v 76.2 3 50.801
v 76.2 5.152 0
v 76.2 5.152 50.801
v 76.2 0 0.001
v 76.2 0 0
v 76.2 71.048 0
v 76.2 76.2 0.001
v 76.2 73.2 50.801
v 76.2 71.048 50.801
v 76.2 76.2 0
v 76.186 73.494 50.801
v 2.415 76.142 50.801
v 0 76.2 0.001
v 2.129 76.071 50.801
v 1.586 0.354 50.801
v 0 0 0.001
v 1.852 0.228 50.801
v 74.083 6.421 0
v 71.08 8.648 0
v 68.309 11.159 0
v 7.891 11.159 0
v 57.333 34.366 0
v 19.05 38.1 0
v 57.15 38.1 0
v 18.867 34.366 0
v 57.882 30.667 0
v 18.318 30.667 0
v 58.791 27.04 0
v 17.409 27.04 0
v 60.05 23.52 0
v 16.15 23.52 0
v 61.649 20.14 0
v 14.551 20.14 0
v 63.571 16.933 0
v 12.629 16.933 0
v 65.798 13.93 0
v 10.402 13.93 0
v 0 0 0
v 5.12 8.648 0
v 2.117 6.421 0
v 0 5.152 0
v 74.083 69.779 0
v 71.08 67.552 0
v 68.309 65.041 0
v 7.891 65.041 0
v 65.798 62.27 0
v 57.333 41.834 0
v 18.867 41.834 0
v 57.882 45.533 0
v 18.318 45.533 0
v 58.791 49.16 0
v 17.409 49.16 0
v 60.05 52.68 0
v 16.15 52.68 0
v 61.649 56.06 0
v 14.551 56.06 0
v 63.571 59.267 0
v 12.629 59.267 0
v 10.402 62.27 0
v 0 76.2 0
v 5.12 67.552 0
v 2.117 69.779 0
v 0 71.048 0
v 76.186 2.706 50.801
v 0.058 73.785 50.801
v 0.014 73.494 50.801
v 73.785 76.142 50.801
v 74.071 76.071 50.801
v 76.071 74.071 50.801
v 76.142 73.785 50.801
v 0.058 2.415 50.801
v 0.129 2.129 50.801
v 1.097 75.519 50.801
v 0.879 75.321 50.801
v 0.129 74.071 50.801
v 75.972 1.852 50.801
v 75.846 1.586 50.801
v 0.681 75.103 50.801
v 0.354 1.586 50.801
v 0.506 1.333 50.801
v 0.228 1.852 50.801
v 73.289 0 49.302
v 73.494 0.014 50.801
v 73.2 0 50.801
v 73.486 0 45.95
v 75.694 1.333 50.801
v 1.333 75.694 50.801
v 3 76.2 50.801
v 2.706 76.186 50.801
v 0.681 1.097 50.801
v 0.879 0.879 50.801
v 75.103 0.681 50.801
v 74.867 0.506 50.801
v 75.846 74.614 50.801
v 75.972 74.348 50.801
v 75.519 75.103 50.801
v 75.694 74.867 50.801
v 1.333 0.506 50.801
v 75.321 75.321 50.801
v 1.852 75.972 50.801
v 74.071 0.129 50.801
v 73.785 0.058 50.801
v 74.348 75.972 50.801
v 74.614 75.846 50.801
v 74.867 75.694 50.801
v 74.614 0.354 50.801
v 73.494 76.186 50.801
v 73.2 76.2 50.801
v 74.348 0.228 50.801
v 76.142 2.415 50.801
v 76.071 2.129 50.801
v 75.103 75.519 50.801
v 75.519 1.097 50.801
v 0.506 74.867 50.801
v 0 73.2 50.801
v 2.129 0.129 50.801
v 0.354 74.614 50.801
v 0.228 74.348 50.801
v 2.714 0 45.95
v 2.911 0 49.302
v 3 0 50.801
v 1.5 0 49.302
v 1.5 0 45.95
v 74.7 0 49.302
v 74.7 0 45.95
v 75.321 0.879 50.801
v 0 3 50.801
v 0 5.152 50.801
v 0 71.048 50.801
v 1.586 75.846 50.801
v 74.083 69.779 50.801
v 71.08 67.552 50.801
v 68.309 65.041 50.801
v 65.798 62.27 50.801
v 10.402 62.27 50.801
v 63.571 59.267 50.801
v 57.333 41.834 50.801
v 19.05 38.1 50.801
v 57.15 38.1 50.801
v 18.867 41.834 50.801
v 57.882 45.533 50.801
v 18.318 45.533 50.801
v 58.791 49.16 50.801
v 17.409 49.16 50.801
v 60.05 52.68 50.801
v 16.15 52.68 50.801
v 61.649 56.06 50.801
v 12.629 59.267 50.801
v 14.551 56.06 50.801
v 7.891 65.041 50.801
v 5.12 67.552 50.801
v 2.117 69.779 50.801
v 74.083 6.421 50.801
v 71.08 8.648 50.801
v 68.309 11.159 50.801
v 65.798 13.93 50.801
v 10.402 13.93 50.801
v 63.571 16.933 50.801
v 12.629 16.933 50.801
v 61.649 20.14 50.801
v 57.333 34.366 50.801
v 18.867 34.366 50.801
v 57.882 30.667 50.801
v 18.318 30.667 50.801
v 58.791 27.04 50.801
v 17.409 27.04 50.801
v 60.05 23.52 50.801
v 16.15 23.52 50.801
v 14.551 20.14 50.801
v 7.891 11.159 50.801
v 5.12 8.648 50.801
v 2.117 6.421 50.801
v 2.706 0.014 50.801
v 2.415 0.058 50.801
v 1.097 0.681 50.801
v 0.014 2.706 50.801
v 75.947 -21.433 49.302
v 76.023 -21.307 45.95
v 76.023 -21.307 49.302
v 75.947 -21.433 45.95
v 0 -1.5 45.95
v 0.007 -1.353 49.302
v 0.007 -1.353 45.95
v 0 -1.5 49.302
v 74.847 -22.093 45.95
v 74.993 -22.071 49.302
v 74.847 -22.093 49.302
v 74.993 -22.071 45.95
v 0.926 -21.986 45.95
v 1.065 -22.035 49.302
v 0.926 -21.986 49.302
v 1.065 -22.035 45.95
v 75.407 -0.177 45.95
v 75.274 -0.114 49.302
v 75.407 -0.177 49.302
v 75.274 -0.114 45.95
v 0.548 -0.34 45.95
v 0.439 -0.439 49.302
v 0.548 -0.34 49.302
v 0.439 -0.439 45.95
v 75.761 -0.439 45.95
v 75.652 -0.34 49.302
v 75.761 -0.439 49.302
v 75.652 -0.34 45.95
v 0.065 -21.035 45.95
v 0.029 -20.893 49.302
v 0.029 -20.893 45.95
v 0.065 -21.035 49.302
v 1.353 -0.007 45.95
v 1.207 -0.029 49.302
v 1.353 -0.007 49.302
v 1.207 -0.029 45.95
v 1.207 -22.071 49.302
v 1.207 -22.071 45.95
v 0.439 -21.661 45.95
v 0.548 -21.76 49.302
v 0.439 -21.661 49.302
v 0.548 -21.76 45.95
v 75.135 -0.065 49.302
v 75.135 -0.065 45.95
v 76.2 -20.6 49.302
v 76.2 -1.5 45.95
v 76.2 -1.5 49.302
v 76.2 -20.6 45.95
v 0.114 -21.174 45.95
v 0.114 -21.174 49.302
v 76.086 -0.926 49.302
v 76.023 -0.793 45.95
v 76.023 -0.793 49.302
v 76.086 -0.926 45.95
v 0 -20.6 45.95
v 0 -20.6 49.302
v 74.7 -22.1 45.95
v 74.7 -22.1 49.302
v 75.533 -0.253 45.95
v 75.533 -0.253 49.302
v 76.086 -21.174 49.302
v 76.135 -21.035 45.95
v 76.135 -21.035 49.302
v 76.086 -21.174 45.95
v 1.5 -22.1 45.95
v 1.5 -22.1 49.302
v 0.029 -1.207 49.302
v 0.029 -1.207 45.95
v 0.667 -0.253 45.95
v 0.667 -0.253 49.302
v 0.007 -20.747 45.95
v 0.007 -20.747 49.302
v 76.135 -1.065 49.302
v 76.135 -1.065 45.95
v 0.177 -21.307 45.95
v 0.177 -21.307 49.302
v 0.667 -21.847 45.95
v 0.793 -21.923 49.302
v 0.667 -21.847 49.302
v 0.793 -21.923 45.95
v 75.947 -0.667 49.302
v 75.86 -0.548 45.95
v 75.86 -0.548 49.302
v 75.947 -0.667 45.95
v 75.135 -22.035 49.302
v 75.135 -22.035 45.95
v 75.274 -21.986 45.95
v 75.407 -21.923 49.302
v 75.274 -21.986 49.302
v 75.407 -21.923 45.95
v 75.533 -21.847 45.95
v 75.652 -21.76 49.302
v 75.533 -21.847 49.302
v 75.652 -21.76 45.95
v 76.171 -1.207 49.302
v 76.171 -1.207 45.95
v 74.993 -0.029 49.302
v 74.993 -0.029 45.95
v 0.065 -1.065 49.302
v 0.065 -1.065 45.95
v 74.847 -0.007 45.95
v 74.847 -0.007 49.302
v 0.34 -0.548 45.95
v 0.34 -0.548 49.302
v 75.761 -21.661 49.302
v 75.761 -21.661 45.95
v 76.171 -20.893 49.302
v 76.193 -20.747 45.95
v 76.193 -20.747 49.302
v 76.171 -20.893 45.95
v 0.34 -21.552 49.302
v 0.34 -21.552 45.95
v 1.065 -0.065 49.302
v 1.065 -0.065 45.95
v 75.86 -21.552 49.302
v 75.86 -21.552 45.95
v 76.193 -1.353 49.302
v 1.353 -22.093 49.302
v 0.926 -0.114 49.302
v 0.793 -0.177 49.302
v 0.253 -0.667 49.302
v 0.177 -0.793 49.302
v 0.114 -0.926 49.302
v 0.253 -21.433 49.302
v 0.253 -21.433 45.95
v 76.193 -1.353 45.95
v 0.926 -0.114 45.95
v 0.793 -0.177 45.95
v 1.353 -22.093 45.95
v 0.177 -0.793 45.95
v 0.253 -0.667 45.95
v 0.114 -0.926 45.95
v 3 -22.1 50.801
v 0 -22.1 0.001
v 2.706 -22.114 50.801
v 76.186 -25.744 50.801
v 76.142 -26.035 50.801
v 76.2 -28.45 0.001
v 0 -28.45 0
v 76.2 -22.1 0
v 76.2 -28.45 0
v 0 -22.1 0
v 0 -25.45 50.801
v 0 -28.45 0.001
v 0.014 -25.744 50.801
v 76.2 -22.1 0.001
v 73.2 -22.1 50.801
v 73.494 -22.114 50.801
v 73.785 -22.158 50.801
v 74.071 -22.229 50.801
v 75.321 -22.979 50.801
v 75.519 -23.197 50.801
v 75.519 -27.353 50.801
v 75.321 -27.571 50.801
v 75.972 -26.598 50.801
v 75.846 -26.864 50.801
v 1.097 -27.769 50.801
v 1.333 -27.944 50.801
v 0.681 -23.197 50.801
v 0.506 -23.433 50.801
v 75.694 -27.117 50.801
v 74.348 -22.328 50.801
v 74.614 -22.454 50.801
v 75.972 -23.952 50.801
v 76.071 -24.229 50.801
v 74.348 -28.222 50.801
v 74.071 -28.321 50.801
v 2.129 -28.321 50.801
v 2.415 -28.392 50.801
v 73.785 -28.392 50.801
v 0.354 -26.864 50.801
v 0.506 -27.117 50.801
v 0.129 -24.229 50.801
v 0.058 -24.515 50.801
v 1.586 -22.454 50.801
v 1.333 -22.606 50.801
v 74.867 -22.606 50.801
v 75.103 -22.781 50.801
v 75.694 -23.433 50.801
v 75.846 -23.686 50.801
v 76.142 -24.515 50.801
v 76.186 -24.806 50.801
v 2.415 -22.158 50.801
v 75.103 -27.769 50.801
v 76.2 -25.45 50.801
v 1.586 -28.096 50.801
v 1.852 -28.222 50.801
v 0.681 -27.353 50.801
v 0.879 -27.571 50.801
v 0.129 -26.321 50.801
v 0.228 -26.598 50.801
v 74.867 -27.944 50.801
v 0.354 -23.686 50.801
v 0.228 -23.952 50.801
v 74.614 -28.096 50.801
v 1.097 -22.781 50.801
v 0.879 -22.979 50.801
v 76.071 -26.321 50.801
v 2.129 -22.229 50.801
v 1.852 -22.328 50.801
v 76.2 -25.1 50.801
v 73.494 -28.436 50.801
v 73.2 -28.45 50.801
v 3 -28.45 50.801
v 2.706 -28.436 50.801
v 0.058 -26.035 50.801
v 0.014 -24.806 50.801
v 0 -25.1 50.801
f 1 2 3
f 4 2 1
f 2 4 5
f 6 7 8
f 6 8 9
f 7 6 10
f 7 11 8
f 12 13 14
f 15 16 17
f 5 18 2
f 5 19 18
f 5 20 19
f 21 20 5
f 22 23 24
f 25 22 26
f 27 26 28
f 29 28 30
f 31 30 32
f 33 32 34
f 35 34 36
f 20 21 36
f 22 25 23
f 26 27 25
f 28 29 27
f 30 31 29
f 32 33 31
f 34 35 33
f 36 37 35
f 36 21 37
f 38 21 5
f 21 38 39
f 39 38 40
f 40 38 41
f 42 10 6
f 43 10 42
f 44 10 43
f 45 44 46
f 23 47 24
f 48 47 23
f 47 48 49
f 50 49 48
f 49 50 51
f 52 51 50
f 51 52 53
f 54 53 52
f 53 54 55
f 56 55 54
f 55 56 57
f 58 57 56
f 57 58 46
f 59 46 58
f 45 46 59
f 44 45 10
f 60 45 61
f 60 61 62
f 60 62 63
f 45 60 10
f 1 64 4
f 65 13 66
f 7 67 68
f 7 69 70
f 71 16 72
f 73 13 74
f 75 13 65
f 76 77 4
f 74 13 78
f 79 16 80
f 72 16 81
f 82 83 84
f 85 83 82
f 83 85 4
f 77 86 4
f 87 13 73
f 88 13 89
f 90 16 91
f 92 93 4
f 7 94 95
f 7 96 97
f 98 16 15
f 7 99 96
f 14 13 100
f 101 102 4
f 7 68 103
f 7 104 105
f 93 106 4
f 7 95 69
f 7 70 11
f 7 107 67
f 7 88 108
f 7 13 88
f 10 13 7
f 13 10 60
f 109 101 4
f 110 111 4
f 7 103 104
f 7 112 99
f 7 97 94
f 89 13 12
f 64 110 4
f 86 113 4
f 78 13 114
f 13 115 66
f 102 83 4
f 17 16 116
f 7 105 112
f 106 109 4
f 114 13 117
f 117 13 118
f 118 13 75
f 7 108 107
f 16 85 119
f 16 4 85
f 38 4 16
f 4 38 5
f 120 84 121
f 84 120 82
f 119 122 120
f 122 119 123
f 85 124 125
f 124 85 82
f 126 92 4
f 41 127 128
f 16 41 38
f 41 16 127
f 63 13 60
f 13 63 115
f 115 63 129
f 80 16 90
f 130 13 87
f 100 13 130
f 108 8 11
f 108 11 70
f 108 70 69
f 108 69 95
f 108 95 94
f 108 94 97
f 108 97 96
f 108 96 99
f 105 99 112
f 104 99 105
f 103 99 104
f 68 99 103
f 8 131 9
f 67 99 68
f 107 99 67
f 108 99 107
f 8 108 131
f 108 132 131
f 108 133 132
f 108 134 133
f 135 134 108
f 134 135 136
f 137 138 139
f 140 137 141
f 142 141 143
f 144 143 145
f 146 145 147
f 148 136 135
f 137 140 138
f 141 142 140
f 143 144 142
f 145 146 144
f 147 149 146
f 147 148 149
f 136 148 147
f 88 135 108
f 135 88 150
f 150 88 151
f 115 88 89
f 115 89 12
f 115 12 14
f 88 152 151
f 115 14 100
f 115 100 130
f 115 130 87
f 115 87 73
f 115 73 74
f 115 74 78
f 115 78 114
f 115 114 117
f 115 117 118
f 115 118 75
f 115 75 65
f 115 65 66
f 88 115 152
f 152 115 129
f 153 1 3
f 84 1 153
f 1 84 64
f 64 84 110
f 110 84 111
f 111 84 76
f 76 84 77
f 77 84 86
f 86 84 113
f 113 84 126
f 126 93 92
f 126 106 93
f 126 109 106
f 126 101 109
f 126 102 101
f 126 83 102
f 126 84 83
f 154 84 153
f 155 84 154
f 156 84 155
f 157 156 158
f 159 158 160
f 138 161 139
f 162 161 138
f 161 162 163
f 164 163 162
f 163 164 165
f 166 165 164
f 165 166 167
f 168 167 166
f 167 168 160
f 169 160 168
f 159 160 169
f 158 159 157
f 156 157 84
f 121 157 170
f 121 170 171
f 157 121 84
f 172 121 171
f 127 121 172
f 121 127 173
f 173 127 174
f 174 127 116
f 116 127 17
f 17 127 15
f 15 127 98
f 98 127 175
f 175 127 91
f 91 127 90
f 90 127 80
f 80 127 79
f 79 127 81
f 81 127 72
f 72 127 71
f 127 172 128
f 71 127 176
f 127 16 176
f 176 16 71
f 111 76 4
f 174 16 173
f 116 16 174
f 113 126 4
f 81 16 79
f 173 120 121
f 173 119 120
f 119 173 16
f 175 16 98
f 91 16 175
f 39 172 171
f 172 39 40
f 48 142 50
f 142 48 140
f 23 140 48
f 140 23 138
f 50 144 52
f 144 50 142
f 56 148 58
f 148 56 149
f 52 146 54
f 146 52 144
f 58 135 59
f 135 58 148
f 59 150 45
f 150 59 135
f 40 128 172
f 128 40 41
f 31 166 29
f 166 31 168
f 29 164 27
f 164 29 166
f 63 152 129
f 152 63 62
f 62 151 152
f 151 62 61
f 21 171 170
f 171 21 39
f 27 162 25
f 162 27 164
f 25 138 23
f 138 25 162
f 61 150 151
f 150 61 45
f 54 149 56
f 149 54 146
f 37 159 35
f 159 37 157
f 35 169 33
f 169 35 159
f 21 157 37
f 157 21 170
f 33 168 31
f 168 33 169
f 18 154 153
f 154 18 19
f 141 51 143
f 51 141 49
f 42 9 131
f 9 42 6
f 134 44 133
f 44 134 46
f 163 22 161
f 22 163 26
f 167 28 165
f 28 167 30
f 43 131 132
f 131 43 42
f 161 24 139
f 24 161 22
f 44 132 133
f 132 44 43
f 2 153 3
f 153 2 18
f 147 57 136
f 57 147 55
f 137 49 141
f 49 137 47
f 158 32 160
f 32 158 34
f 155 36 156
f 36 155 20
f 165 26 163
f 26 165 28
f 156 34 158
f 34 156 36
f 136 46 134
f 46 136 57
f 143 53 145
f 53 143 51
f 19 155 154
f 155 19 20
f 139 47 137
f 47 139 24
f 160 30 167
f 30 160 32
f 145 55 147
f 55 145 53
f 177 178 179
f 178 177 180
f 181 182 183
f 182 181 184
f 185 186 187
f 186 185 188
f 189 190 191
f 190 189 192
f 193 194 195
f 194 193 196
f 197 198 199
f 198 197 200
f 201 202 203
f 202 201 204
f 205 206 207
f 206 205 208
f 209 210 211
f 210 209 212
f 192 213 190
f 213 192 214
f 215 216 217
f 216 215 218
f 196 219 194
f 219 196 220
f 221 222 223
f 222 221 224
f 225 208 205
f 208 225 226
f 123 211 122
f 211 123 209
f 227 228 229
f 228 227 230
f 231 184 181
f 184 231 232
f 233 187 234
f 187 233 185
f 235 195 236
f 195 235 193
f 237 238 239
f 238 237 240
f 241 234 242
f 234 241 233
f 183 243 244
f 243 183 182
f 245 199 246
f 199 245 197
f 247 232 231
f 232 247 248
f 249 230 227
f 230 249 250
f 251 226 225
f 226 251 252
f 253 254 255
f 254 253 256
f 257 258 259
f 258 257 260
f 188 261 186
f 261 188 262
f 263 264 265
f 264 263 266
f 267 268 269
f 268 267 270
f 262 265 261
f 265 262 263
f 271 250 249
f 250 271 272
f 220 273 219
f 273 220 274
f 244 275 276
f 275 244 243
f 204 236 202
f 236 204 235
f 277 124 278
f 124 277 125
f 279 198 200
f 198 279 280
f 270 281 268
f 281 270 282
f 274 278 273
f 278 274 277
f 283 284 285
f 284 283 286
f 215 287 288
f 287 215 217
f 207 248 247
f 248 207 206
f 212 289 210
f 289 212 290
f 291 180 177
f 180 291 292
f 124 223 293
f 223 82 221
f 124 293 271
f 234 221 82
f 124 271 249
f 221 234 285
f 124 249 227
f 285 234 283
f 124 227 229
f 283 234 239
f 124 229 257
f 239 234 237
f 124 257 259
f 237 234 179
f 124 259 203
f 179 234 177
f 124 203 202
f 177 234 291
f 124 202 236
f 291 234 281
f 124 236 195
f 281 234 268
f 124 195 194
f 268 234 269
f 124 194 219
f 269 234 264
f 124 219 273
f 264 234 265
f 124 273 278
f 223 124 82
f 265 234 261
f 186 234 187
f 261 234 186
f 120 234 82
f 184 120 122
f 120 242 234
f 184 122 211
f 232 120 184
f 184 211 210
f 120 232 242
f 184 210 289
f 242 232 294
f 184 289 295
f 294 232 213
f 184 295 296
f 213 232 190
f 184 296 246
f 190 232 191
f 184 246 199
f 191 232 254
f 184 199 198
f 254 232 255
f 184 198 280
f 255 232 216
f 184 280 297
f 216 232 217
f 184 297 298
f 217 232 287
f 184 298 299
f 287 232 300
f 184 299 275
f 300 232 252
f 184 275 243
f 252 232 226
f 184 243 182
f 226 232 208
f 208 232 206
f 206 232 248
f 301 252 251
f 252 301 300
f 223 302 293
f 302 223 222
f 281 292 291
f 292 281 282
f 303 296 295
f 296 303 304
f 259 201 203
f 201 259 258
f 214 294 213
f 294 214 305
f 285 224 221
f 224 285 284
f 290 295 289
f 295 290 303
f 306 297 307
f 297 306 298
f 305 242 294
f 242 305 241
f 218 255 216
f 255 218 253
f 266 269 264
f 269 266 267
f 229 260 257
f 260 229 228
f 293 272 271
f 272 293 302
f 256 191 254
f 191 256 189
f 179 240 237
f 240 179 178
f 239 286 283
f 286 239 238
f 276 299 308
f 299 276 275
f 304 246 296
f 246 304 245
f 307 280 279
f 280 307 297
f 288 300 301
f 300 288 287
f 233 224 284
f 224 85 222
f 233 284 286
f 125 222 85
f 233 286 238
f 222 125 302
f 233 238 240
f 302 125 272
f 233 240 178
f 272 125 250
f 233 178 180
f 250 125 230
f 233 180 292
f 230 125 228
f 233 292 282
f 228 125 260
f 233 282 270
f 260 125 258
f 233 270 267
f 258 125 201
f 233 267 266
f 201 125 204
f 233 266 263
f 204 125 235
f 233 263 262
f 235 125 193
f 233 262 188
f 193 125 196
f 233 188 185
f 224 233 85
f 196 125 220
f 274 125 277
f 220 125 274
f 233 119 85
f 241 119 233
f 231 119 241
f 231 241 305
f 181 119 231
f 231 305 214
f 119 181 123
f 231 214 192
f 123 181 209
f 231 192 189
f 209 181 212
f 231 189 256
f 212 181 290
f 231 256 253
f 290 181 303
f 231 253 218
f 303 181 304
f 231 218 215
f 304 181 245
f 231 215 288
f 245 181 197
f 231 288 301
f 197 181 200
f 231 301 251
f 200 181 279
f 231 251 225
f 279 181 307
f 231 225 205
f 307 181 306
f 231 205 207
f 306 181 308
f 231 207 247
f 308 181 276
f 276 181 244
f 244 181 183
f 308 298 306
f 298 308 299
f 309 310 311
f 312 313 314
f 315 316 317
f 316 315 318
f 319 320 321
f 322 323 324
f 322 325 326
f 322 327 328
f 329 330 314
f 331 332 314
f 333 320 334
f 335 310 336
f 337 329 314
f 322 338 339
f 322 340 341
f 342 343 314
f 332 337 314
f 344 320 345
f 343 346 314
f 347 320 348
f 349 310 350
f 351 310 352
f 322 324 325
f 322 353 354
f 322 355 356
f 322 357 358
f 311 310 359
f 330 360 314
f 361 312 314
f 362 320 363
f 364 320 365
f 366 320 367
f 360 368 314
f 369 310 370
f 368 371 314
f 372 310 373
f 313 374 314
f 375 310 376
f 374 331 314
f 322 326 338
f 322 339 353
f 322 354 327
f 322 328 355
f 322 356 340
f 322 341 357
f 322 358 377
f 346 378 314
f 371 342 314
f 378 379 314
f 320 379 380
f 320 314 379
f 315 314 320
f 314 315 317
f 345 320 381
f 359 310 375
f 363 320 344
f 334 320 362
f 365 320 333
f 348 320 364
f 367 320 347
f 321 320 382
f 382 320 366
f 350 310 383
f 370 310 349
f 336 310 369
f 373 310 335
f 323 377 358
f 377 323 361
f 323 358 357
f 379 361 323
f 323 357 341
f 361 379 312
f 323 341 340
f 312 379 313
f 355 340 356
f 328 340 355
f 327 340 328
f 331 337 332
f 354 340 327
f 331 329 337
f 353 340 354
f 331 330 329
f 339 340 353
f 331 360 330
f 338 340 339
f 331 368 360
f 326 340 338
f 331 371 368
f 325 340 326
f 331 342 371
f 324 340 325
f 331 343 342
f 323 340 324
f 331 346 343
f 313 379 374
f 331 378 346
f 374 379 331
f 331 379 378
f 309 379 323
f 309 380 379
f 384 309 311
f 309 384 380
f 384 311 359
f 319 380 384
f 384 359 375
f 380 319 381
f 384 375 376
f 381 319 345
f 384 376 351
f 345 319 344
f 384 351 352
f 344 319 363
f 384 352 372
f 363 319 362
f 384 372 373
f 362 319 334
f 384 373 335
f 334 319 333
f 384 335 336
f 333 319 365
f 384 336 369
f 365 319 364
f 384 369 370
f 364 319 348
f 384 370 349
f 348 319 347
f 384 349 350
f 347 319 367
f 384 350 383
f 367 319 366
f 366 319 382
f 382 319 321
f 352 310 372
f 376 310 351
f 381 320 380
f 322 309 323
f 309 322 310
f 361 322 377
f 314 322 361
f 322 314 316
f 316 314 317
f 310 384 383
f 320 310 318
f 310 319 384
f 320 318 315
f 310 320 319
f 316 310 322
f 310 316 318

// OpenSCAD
inch = 25.4;

spacer = [3 * inch, 3 * inch, 2 * inch];
clip_top = [spacer[0], 22.1, .25 * inch];
clip_side = [spacer[0], clip_top[2], spacer[2]];

cutout_h = 3 * inch;
cutout_r = 1.5 * inch;
roundness = 64;
r = 3;

// Rounds only the top edge of a box. Bottom stays flat.
// Replaces: cube(size)
module cube_round_top(size, radius) {
    hull() {
        // bottom face — full footprint, razor thin
        cube([size[0], size[1], 0.001]);
        // top face — inset, with rounded corners
        translate([radius, radius, size[2] - radius])
            minkowski() {
                cube([size[0] - 2*radius, size[1] - 2*radius, 0.001]);
                cylinder(r=radius, h=radius, $fn=roundness);
            }
    }
}

// Rounds top AND bottom edges of a box.
// Replaces: cube(size)
module cube_round_top_bottom(size, radius) {
    hull() {
        // bottom inset
        translate([radius, radius, radius])
            minkowski() {
                cube([size[0] - 2*radius, size[1] - 2*radius, 0.001]);
                cylinder(r=radius, h=0.001, $fn=roundness);
            }
        // top inset
        translate([radius, radius, size[2] - radius])
            minkowski() {
                cube([size[0] - 2*radius, size[1] - 2*radius, 0.001]);
                cylinder(r=radius, h=0.001, $fn=roundness);
            }
    }
}

// Main body — round top edge only
difference() {
    cube_round_top(spacer, r);
    translate([-(cutout_r / 2), cutout_r, 0])
        cylinder(h = cutout_h, r = cutout_r, $fn = roundness);
    translate([(cutout_r * 2.5), cutout_r, 0])
        cylinder(h = cutout_h, r = cutout_r, $fn = roundness);
}

// Clip top — round top and bottom edges (same translation as original)
translate([0, -clip_top[1], (spacer[2] - clip_top[2])])
    cube_round_top_bottom(clip_top, 1.5);

// Clip side — round top edge only (same translation as original)
translate([0, -(clip_top[1] + clip_side[1]), (spacer[2] - clip_side[2])])
    cube_round_top(clip_side, r);
